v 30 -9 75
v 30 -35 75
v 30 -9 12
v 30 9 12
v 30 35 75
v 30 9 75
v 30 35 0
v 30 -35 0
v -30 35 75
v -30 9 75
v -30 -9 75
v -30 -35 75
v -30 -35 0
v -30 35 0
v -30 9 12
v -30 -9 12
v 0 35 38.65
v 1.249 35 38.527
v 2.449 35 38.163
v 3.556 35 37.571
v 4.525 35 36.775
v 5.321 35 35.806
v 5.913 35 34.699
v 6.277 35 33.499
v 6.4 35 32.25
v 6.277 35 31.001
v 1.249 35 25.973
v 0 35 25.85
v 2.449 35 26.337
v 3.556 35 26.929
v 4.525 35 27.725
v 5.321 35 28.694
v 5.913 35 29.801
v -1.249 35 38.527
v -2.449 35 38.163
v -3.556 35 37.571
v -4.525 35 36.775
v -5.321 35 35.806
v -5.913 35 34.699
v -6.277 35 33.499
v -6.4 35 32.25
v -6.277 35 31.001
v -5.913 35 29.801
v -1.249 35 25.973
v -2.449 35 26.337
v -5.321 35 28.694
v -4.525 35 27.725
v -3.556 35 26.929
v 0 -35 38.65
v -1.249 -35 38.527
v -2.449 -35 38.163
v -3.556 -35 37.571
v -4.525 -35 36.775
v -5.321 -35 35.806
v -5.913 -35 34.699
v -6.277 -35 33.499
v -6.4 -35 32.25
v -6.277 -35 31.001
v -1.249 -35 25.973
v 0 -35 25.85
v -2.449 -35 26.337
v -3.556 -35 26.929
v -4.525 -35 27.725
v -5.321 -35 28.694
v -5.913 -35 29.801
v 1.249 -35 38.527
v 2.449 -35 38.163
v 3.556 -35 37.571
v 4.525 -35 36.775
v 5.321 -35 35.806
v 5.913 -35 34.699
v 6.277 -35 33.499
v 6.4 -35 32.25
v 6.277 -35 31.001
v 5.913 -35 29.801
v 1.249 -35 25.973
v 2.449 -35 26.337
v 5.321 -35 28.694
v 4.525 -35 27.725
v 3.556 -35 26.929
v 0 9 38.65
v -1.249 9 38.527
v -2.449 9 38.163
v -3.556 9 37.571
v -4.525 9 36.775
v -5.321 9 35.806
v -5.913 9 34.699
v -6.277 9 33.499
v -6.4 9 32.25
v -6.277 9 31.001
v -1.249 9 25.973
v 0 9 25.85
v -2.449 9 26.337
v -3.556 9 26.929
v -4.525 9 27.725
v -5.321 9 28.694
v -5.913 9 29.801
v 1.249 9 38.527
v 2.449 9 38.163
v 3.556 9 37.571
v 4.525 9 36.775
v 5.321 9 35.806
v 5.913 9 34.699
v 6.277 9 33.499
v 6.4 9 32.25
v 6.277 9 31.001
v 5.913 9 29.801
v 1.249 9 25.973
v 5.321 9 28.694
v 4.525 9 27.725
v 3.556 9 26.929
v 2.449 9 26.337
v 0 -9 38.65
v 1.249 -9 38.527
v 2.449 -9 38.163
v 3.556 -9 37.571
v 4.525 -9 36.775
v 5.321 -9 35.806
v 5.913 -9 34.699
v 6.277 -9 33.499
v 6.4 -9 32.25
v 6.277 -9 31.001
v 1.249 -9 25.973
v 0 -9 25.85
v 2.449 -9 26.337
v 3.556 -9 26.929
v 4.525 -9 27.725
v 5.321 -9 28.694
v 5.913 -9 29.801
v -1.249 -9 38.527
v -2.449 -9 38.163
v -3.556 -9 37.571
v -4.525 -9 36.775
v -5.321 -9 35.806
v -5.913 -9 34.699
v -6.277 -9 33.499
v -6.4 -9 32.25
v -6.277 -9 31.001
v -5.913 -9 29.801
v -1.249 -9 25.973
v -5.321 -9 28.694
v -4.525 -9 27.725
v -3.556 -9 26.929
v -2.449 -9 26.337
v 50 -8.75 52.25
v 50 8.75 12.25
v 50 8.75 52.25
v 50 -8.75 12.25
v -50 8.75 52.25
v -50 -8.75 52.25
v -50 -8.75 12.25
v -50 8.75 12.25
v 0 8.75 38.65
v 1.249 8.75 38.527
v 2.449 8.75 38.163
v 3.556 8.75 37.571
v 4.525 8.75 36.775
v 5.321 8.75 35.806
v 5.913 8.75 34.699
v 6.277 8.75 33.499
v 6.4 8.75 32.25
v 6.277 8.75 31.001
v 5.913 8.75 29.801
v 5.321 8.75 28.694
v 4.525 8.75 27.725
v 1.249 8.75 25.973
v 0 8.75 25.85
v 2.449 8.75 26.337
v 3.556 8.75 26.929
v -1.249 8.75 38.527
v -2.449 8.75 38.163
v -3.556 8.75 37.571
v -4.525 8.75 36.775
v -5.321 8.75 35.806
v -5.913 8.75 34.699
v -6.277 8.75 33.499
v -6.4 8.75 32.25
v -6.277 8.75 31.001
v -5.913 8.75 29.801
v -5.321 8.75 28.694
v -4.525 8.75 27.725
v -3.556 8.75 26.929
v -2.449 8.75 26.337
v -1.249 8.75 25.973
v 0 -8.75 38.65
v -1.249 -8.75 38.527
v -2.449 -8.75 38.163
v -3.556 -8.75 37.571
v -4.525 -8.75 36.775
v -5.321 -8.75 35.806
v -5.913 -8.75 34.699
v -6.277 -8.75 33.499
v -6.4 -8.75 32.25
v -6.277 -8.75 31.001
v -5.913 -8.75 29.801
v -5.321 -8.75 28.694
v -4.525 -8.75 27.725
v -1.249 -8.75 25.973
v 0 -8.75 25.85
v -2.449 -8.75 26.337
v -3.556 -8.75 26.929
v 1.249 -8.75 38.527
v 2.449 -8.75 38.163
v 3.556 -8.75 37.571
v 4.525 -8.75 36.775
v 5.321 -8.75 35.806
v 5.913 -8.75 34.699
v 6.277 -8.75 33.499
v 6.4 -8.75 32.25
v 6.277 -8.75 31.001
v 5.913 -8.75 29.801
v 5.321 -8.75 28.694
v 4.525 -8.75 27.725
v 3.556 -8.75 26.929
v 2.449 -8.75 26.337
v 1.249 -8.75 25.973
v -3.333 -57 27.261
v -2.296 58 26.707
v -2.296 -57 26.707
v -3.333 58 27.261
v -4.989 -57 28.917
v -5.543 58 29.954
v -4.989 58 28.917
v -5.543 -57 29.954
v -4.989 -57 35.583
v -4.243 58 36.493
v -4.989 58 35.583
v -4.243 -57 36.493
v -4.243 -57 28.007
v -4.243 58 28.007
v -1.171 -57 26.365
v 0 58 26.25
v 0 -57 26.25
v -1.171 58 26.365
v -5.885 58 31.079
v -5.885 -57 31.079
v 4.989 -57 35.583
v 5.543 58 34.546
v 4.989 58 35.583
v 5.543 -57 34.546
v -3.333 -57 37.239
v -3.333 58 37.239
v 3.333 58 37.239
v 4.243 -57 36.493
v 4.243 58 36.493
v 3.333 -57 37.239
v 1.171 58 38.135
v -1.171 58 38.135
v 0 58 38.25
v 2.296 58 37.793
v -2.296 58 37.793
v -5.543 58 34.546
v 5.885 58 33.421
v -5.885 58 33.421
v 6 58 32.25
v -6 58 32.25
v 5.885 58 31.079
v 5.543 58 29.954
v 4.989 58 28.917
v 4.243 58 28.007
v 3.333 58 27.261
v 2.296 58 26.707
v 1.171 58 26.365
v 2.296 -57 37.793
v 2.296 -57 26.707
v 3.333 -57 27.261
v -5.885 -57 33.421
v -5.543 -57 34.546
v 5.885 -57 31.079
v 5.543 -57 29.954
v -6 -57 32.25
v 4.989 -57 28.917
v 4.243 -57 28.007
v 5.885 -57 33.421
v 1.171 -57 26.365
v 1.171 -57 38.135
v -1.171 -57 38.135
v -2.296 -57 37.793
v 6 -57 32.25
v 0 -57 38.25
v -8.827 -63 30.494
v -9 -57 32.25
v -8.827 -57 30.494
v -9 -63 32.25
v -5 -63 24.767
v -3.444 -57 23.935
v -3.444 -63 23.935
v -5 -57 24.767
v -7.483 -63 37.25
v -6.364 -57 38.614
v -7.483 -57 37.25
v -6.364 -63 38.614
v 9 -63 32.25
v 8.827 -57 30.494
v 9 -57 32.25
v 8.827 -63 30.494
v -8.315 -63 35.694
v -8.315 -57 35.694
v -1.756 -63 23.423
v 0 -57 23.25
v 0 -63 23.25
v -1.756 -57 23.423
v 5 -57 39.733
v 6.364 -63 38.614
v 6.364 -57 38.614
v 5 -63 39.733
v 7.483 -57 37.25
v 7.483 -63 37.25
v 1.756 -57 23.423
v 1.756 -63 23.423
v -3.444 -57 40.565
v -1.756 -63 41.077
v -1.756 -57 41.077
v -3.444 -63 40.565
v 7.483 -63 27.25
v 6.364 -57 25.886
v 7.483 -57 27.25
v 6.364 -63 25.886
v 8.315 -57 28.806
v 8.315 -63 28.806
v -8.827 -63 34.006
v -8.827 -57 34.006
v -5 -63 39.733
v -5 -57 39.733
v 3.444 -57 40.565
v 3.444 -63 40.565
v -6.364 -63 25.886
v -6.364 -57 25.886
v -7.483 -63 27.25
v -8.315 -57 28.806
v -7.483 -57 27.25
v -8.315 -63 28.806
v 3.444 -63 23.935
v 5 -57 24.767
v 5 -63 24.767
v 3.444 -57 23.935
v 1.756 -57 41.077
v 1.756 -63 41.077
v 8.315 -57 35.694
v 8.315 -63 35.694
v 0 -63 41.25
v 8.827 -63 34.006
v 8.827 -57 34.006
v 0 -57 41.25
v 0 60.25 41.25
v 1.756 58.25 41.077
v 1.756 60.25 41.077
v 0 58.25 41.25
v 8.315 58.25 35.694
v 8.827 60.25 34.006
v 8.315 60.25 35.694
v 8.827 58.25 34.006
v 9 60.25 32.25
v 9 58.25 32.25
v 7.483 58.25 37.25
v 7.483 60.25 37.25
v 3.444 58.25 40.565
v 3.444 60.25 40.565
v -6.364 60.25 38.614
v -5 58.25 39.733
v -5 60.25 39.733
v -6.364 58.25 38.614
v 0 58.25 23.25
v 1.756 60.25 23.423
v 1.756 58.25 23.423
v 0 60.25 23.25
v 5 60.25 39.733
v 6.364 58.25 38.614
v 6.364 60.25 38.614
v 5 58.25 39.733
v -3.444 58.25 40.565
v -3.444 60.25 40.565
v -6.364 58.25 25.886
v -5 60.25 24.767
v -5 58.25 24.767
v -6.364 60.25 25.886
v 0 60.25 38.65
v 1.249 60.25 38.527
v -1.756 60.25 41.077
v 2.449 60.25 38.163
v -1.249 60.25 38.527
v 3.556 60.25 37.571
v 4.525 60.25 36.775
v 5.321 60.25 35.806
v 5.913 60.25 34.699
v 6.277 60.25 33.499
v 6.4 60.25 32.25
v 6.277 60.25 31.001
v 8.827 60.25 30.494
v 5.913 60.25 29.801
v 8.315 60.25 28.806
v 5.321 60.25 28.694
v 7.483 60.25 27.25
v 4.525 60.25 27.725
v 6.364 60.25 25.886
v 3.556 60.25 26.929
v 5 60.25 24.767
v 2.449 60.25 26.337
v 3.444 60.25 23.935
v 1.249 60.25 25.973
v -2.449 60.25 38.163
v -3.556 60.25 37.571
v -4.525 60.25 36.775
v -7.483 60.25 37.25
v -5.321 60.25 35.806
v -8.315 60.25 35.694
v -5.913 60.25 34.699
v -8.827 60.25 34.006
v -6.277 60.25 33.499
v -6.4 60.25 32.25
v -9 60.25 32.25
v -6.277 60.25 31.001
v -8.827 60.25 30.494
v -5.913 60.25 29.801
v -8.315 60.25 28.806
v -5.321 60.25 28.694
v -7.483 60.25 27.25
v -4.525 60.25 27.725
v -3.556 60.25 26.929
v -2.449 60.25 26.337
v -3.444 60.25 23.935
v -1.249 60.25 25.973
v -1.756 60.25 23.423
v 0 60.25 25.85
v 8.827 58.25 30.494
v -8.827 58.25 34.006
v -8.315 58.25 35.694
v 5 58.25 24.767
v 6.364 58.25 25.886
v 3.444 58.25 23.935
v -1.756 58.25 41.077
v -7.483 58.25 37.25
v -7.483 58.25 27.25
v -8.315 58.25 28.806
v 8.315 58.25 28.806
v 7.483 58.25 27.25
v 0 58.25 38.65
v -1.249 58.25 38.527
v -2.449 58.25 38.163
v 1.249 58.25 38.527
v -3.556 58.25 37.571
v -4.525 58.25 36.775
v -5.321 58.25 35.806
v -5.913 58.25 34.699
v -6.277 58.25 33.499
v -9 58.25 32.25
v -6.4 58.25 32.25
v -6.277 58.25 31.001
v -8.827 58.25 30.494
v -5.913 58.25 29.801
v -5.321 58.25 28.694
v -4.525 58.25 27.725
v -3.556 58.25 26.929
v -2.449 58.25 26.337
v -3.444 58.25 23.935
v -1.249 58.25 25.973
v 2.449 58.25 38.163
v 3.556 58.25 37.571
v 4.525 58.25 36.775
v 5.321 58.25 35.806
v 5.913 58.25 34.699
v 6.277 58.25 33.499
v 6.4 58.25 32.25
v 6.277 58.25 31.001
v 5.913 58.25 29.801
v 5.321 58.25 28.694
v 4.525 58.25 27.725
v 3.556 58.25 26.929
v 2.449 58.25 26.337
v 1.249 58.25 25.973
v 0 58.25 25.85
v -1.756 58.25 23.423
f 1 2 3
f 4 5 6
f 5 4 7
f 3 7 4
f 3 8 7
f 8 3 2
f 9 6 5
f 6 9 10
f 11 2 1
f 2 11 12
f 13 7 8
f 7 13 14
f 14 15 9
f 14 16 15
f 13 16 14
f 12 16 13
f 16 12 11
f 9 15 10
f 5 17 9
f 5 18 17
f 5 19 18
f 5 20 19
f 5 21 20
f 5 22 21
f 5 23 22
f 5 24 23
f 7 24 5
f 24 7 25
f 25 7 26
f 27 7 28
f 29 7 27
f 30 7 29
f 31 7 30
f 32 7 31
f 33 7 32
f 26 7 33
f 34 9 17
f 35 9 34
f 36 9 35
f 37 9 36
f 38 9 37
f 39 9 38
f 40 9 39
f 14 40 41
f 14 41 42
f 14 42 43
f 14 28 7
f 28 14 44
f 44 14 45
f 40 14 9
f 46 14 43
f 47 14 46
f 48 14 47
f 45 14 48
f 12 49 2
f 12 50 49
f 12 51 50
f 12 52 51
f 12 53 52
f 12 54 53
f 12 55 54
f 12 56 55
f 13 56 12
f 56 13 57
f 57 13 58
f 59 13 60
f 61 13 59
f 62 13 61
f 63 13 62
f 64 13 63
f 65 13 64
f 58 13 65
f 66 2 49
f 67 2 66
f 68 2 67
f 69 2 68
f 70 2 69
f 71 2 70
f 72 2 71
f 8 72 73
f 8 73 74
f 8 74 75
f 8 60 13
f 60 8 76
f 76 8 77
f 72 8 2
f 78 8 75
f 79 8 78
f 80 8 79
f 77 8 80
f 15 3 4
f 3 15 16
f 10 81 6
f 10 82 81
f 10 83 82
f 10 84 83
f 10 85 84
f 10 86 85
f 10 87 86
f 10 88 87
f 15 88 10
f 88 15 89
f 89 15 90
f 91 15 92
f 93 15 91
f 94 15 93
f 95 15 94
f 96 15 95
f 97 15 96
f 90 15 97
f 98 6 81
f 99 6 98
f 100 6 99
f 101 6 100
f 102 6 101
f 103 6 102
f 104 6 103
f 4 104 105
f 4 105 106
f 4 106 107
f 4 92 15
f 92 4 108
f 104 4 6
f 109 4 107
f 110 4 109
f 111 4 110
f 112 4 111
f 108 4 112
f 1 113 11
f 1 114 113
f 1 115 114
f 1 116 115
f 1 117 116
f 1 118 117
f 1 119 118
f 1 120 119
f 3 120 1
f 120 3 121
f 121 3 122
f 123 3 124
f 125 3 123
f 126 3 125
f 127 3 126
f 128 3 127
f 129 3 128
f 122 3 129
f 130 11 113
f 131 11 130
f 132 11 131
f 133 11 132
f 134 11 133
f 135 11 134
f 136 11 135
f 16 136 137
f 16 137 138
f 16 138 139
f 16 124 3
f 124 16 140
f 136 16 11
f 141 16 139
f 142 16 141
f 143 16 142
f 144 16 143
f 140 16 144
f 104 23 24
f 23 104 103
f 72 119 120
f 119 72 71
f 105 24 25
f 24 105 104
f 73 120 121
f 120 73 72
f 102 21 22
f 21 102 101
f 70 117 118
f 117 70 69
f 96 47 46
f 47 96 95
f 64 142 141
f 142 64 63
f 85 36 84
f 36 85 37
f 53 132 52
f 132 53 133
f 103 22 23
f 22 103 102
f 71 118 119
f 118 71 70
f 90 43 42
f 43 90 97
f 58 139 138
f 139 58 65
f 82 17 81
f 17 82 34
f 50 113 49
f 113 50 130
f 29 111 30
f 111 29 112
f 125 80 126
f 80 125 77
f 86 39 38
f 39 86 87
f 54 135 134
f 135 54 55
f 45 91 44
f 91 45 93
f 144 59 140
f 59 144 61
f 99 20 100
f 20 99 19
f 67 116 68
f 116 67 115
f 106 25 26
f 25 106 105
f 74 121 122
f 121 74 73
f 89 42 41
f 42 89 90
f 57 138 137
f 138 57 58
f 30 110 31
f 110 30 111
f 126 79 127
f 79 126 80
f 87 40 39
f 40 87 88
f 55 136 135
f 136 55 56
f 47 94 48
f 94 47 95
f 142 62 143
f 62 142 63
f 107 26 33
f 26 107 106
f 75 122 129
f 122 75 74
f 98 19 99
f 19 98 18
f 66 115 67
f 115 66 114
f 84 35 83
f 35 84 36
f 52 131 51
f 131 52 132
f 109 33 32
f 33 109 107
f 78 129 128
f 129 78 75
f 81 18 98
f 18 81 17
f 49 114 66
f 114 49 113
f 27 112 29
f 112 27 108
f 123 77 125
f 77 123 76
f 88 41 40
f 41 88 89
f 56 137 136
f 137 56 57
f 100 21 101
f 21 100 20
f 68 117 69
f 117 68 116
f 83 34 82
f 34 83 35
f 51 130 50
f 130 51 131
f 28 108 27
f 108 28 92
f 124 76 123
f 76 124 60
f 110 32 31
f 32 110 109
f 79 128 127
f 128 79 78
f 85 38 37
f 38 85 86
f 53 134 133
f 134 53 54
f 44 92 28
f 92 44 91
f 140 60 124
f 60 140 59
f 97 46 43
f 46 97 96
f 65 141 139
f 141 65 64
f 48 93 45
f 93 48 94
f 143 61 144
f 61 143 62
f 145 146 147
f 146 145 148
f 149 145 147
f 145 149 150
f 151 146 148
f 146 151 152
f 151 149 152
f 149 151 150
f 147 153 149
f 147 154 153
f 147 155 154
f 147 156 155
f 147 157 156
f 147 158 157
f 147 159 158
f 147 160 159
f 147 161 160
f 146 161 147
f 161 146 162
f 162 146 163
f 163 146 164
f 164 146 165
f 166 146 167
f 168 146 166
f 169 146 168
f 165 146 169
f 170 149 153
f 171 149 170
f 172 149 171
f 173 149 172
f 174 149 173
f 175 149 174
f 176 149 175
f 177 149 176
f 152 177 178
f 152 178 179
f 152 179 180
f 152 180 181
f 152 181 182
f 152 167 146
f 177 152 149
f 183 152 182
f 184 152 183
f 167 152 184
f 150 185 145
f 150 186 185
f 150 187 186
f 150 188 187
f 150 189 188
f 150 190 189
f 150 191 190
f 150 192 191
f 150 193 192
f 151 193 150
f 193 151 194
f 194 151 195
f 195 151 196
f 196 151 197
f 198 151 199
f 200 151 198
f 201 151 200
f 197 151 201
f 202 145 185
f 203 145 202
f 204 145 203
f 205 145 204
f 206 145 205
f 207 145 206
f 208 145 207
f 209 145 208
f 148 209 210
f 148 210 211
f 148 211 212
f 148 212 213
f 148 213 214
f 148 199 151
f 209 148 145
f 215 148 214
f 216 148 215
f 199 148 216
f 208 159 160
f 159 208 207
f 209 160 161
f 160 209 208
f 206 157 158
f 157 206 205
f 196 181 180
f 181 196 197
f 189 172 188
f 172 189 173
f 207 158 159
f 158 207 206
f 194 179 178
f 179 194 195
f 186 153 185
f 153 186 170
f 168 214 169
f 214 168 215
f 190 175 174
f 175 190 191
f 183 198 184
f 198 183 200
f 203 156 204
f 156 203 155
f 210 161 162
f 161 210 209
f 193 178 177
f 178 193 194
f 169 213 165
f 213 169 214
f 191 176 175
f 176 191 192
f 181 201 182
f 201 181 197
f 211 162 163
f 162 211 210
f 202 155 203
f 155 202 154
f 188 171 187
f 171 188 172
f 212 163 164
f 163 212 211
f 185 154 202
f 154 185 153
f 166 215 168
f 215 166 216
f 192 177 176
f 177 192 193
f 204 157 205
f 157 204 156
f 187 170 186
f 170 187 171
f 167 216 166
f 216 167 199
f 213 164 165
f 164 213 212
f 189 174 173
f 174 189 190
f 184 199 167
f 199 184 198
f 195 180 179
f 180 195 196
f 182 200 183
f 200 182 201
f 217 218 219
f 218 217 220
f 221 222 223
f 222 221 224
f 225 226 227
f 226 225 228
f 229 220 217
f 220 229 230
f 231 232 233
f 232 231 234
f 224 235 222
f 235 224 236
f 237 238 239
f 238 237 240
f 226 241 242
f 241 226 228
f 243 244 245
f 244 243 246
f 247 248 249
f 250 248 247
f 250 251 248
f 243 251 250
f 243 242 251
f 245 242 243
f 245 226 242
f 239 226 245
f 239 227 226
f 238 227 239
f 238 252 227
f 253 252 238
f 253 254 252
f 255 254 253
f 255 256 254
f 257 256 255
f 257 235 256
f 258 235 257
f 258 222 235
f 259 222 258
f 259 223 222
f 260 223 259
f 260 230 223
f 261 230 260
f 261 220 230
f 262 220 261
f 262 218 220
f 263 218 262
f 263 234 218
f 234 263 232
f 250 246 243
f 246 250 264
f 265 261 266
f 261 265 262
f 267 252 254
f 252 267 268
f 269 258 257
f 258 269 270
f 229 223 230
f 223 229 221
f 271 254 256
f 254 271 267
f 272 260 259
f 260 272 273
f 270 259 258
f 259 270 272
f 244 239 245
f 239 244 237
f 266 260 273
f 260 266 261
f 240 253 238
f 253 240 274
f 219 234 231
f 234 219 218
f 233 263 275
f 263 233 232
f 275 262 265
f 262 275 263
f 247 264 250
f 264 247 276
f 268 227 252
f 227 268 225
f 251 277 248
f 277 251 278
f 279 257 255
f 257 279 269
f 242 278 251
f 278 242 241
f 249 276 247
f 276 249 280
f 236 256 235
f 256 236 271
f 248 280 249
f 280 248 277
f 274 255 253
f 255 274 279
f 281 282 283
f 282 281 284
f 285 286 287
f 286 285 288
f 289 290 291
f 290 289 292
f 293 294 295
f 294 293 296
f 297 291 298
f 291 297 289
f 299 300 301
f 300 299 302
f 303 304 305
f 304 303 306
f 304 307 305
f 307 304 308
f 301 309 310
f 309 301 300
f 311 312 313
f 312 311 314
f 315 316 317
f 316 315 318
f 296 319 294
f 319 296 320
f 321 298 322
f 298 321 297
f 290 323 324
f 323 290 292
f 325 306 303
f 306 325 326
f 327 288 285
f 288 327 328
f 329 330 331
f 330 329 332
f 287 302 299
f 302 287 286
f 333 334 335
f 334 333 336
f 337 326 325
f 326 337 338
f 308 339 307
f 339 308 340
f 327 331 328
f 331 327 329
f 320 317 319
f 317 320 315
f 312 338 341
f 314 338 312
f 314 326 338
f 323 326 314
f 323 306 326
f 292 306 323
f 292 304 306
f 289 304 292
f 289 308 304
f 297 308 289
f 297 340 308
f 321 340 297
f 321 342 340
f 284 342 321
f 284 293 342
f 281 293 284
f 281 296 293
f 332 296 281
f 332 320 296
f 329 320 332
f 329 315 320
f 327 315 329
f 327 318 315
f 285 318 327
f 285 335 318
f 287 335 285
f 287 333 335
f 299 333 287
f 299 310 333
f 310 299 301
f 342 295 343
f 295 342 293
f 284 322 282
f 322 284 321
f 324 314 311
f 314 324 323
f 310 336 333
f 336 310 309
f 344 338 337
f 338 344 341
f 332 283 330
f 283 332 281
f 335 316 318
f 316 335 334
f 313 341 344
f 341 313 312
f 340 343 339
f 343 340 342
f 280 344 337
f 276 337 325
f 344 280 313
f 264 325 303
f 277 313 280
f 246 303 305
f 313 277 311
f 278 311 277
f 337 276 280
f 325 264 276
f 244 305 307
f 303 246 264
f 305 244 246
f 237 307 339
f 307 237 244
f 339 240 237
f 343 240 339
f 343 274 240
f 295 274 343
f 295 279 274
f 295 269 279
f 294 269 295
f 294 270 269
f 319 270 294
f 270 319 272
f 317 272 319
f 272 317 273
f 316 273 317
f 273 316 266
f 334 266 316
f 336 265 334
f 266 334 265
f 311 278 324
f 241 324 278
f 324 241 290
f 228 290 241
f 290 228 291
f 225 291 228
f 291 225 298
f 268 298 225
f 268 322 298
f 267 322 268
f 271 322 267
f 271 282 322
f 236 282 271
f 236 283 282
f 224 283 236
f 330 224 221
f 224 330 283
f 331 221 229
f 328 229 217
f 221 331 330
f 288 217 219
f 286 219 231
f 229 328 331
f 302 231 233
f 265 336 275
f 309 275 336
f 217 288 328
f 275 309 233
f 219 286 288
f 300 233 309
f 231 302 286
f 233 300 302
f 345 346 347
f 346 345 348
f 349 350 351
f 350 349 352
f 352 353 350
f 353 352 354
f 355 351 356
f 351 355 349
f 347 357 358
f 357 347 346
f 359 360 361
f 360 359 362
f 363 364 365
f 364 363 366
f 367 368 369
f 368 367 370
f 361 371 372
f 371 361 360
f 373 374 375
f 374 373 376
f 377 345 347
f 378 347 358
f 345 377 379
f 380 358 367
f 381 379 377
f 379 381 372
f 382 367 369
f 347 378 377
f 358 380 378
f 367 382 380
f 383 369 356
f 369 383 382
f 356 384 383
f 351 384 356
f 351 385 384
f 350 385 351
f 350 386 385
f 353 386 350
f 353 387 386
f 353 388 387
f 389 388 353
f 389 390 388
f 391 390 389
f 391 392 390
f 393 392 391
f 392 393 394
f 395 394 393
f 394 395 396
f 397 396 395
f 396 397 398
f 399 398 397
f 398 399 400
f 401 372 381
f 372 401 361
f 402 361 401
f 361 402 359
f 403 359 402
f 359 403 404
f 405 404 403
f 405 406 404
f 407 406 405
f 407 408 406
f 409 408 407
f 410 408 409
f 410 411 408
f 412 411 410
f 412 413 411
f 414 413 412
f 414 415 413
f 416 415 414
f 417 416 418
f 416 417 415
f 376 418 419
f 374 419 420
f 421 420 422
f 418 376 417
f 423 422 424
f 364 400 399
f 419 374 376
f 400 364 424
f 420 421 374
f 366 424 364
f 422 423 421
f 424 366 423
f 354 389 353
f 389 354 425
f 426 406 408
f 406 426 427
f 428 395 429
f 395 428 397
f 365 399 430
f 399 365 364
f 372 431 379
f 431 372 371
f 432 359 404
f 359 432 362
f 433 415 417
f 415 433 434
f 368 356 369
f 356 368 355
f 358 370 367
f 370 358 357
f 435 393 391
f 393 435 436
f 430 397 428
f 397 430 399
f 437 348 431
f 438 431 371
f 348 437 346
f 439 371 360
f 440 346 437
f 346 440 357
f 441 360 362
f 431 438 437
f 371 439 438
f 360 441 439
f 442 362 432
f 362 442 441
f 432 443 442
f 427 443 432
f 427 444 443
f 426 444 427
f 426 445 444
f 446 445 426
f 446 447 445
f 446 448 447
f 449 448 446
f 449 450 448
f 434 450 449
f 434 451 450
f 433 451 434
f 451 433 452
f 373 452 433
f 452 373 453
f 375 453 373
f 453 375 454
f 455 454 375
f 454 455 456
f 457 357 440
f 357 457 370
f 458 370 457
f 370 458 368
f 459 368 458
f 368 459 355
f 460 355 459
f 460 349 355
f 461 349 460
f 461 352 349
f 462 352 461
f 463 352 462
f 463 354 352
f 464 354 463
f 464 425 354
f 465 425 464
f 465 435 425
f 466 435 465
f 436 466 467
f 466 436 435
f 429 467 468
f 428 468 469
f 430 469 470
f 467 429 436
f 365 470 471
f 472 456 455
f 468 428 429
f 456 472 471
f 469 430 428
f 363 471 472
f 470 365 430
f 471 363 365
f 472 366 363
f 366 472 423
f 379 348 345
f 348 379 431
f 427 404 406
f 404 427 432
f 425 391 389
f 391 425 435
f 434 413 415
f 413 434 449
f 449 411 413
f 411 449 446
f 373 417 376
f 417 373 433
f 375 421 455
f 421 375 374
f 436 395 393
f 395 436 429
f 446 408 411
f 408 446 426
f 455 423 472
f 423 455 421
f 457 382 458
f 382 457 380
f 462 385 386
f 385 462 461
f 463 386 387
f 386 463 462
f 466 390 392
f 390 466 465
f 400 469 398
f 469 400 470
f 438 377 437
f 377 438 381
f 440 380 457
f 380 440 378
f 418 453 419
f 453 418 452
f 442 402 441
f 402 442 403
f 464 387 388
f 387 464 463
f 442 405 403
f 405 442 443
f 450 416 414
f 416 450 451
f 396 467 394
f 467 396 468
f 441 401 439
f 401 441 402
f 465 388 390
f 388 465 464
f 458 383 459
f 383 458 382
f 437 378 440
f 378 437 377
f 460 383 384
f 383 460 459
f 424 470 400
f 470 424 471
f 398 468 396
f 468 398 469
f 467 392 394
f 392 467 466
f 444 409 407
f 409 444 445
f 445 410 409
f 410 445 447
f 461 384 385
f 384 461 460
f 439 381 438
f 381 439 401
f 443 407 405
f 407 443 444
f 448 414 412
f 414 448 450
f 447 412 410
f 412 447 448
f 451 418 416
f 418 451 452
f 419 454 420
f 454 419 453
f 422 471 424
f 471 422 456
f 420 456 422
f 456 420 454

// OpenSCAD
$fn = 32;

// ------------------------------------------------------------------------
// Clevis joint: 60 mm clevis, pin d12
// Every part is its own module, assembly() places them once.
// ------------------------------------------------------------------------

// --- part 1 ---
module clevis() {
  difference() {
    translate([-30, -35, 0]) cube([60, 70, 75]);
    translate([-31, -9, 12]) cube([62, 18, 64]);
    translate([0, 0, 32.25]) rotate([90, 0, 0]) cylinder(h = 72, d = 12.8, center = true);
  }
}

// --- part 2 ---
module eye() {
  difference() {
    translate([-50, -8.75, 0]) cube([100, 17.5, 40]);
    translate([0, 0, 20]) rotate([90, 0, 0]) cylinder(h = 19.5, d = 12.8, center = true);
  }
}

// --- part 3 ---
module pin() {
  rotate([0, 90, 0]) cylinder(h = 116, d = 12, center = true);
  translate([-63, 0, 0]) rotate([0, 90, 0]) cylinder(h = 6, d = 18);
}

// --- part 4 ---
module retainer() {
  difference() {
      translate([0, 0, 0]) cylinder(h = 2, d = 18);
      translate([0, 0, -1]) cylinder(h = 4, d = 12.8);
    }
}

// --- assembly ---
module assembly() {
  translate([0, 0, 0]) rotate([0, 0, 0]) clevis();
  translate([0, 0, 12.25]) rotate([0, 0, 0]) eye();
  translate([0, 0, 32.25]) rotate([0, 0, 90]) pin();
  translate([0, 60.25, 32.25]) rotate([90, 0, 0]) retainer();
}

assembly();
